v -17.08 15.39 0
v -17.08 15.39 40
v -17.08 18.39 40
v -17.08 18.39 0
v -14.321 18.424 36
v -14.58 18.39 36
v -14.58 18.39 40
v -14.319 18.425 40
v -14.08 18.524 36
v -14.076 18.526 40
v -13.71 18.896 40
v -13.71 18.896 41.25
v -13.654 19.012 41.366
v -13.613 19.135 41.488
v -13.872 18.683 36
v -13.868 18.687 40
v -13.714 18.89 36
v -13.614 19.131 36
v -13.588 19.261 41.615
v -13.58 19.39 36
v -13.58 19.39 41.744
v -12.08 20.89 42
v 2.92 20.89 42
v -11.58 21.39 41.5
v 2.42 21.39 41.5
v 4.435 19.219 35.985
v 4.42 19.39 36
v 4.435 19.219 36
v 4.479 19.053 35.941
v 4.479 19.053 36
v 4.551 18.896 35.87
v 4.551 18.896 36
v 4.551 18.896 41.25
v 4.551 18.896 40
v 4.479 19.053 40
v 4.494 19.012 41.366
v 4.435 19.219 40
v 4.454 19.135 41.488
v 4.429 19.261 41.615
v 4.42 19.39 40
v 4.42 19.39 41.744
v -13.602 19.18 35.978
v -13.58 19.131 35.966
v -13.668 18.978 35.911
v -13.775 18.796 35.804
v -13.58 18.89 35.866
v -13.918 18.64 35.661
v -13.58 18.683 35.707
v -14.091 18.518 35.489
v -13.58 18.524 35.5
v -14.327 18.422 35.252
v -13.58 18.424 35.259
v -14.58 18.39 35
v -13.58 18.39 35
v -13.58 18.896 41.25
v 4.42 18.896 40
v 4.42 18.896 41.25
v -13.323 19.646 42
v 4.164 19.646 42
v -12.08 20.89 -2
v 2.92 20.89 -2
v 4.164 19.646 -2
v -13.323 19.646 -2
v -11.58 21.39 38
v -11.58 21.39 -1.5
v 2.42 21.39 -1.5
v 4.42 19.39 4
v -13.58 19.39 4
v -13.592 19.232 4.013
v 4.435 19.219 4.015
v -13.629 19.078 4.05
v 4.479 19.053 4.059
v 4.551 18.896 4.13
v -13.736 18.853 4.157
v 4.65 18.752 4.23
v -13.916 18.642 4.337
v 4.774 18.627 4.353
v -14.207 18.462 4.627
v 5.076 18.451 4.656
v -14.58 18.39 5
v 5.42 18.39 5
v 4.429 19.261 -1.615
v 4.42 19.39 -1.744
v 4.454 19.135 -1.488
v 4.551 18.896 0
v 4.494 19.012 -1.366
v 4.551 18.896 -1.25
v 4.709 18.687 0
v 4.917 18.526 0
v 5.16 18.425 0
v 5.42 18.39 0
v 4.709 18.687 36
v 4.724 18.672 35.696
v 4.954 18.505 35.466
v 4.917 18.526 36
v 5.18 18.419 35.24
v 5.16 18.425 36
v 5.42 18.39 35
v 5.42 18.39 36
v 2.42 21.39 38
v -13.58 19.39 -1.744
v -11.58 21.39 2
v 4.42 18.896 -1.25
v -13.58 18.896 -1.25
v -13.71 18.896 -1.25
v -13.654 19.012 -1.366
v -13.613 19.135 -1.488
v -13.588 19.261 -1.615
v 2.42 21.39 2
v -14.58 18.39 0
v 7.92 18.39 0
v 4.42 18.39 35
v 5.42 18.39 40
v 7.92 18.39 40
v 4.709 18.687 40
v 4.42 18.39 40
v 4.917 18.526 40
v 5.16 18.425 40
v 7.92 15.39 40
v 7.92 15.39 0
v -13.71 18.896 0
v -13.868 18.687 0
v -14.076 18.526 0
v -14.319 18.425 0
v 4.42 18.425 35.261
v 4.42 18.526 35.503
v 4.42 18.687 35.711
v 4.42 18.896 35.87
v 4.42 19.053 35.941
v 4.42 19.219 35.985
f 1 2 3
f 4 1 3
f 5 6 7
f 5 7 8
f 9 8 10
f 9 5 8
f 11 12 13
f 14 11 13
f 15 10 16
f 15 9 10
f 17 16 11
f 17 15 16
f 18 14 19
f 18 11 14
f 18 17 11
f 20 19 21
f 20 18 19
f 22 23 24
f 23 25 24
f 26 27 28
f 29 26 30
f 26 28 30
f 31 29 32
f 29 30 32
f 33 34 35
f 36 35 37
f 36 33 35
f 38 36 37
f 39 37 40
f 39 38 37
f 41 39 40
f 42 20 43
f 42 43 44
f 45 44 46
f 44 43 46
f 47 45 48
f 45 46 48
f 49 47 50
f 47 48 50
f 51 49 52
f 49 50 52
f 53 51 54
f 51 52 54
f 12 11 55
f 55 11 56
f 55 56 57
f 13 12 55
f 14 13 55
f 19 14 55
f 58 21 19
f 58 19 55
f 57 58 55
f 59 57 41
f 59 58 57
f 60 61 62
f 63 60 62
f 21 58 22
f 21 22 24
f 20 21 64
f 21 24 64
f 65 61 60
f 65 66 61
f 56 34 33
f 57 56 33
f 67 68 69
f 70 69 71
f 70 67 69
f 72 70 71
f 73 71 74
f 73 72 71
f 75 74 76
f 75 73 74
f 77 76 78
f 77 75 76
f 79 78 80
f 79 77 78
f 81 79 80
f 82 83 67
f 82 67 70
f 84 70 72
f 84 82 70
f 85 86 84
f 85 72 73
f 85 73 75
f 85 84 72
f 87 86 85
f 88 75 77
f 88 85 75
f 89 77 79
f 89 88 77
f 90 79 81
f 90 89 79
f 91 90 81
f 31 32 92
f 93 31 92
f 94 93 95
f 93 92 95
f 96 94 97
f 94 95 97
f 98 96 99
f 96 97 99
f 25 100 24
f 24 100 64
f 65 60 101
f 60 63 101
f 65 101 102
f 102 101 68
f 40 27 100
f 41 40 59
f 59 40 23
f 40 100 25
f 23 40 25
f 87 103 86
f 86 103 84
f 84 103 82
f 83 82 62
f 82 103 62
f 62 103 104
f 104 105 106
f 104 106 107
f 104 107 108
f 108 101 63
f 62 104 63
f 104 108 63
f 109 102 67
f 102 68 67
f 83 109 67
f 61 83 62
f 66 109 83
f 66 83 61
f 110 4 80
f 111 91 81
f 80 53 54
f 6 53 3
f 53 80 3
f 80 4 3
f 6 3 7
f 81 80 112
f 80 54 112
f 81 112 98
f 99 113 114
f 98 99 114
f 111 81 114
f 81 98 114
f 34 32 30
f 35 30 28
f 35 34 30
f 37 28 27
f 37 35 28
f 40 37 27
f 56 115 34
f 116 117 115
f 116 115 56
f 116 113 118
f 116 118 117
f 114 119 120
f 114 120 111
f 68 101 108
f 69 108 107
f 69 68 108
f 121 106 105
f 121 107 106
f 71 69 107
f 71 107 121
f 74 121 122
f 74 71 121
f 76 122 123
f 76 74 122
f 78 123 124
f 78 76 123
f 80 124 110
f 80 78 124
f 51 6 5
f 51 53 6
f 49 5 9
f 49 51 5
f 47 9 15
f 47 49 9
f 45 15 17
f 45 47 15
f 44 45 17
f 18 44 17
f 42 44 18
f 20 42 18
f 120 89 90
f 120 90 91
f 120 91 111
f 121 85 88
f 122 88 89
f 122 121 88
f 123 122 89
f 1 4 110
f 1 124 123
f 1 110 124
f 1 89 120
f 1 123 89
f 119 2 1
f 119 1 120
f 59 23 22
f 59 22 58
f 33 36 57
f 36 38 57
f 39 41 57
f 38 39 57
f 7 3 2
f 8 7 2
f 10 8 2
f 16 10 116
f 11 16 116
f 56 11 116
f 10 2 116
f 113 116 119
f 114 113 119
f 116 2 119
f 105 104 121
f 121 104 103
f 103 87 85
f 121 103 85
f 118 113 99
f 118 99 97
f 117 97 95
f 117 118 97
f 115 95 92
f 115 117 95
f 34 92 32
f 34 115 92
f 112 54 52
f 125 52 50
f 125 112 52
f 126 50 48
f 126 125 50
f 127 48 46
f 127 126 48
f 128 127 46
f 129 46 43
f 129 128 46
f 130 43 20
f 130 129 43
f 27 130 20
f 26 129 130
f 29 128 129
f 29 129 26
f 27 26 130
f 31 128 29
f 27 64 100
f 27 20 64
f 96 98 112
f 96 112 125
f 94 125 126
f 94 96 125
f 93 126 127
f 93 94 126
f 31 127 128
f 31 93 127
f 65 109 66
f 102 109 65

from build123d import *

# Parameters (mm, degrees)
SKETCH_1_W      = 25
SKETCH_1_H      = 3
EXTRUDE_1_DEPTH = 20
SKETCH_2_W      = 18
SKETCH_2_H      = 4
EXTRUDE_2_DEPTH = 3
EXTRUDE_3_DEPTH = 2
CHAMFER_1_SIZE  = 0.75
CHAMFER_2_SIZE  = 0.5
CHAMFER_3_SIZE  = 2
CHAMFER1_SIZE   = 2
FILLET1_R       = 1


with BuildPart() as part:
    # Эскиз1 → Бобышка-Вытянуть1 (new body)
    with BuildSketch(Plane.XY):
        with Locations((-4.579529598, 16.89)):
            Rectangle(SKETCH_1_W, SKETCH_1_H)
    extrude(amount=EXTRUDE_1_DEPTH)

    # Эскиз2 → Бобышка-Вытянуть2 (add)
    with BuildSketch(Plane(origin=(0, 18.39, 0), x_dir=(1, 0, 0), z_dir=(0, 1, 0))):
        with Locations((-4.579529598, -2)):
            Rectangle(SKETCH_2_W, SKETCH_2_H)
    extrude(amount=EXTRUDE_2_DEPTH)

    # Эскиз3 → Бобышка-Вытянуть3 (add)
    with BuildSketch(Plane(origin=(0, 0, 0), x_dir=(-1, 0, 0), z_dir=(0, 0, -1))):
        Polygon((-4.420470402, 21.39), (13.579529598, 21.39), (13.579529598, 19.89), (13.579529598, 18.896471803), (-4.420470402, 18.896471803), (-4.420470402, 19.89), align=None)
    extrude(amount=EXTRUDE_3_DEPTH)

    # Фаска1
    chamfer_1_edges = [part.edges().sort_by_distance(p)[0] for p in [
        (-4.579529598, 18.896471803, -2),
    ]]
    chamfer(chamfer_1_edges, length=CHAMFER_1_SIZE)

    # Фаска2
    chamfer_2_edges = [part.edges().sort_by_distance(p)[0] for p in [
        (-4.579529598, 21.39, -2),
    ]]
    chamfer(chamfer_2_edges, length=CHAMFER_2_SIZE)

    # Фаска3
    chamfer_3_edges = [part.edges().sort_by_distance(p)[0] for p in [
        (-4.579529598, 21.39, 4),
    ]]
    chamfer(chamfer_3_edges, length=CHAMFER_3_SIZE)

    # Зеркальное отражение1: part across plane


with BuildPart() as part_1:
    add(part.part)
    add(part.part.mirror(Plane.XY.offset(20)))

    # Chamfer1
    chamfer1_edges = [part_1.edges().sort_by_distance(p)[0] for p in [
        (4.420470402, 21.39, 39.75),
        (-13.579529598, 21.39, 39.75),
        (4.420470402, 21.39, 0.25),
        (-13.579529598, 21.39, 0.25),
    ]]
    chamfer(chamfer1_edges, length=CHAMFER1_SIZE)

    # Fillet1
    # the kernel refuses this fillet: 1 mm, written as the material it adds along each edge
    with BuildSketch(Plane(origin=(-13.579529598, 18.39, 6.5), x_dir=(-1, 0, 0), z_dir=(0, 0, -1))) as fillet1_piece_1_section:
        with BuildLine():
            CenterArc((FILLET1_R, FILLET1_R), FILLET1_R, 180, 90)
            Line((0, FILLET1_R), (0, 0))
            Line((0, 0), (FILLET1_R, 0))
        make_face()
    fillet1_piece_1 = extrude(amount=6.5, mode=Mode.PRIVATE)
    fillet1_piece_1 = split(fillet1_piece_1, bisect_by=Plane(origin=(-13.579529598, 17.64, 5.75), z_dir=(0, -0.7071067811865476, -0.7071067811865476)), keep=Keep.TOP, mode=Mode.PRIVATE)
    fillet1_piece_1 = fillet1_piece_1 - Plane(origin=(-13.579529598, 19.39, 5), x_dir=(0, 0, -1), z_dir=(1, 0, 0)) * Cylinder(1, 17, mode=Mode.PRIVATE)
    add(fillet1_piece_1)
    with BuildSketch(Plane(origin=(-13.579529598, 18.39, 6.5), x_dir=(-1, 0, 0), z_dir=(0, 0, -1))) as fillet1_piece_2_section:
        with BuildLine():
            CenterArc((FILLET1_R, FILLET1_R), FILLET1_R, 180, 90)
            Line((0, FILLET1_R), (0, 0))
            Line((0, 0), (FILLET1_R, 0))
        make_face()
    fillet1_piece_2 = extrude(amount=9, mode=Mode.PRIVATE)
    fillet1_piece_2 = split(fillet1_piece_2, bisect_by=Plane(origin=(-13.579529598, 14.768235901, 2.878235901), z_dir=(0, 0.7071067811865476, 0.7071067811865476)), keep=Keep.TOP, mode=Mode.PRIVATE)
    fillet1_piece_2 = split(fillet1_piece_2, bisect_by=Plane(origin=(-13.579529598, 18.896471803, 6.5), z_dir=(0, 1, 0)), keep=Keep.TOP, mode=Mode.PRIVATE)
    fillet1_piece_2 = split(fillet1_piece_2, bisect_by=Plane(origin=(-13.579529598, 18.39, 0), z_dir=(0, 0, -1)), keep=Keep.TOP, mode=Mode.PRIVATE)
    add(fillet1_piece_2)
    with BuildSketch(Plane(origin=(6.920470402, 18.39, 4), x_dir=(0, 1, 0), z_dir=(-1, 0, 0))) as fillet1_piece_3_section:
        with BuildLine():
            CenterArc((FILLET1_R, -FILLET1_R), FILLET1_R, 90, 90)
            Line((0, -FILLET1_R), (0, 0))
            Line((0, 0), (FILLET1_R, 0))
        make_face()
    fillet1_piece_3 = extrude(amount=23, mode=Mode.PRIVATE)
    fillet1_piece_3 = split(fillet1_piece_3, bisect_by=Plane(origin=(6.170470402, 17.64, 4), z_dir=(-0.7071067811865476, -0.7071067811865476, 0)), keep=Keep.TOP, mode=Mode.PRIVATE)
    fillet1_piece_3 = split(fillet1_piece_3, bisect_by=Plane(origin=(-3.829529598, 29.14, 4), z_dir=(0.7071067811865476, -0.7071067811865476, 0)), keep=Keep.TOP, mode=Mode.PRIVATE)
    fillet1_piece_3 = fillet1_piece_3 - Plane(origin=(-14.579529598, 19.39, 4), x_dir=(0, -1, 0), z_dir=(0, 0, 1)) * Cylinder(1, 50, mode=Mode.PRIVATE)
    fillet1_piece_3 = fillet1_piece_3 - Plane(origin=(5.420470402, 19.39, 4), x_dir=(-1, 0, 0), z_dir=(0, 0, -1)) * Cylinder(1, 50, mode=Mode.PRIVATE)
    add(fillet1_piece_3)
    with BuildSketch(Plane(origin=(4.420470402, 18.39, -2.5), x_dir=(0, 1, 0), z_dir=(0, 0, 1))) as fillet1_piece_4_section:
        with BuildLine():
            CenterArc((FILLET1_R, -FILLET1_R), FILLET1_R, 90, 90)
            Line((0, -FILLET1_R), (0, 0))
            Line((0, 0), (FILLET1_R, 0))
        make_face()
    fillet1_piece_4 = extrude(amount=9, mode=Mode.PRIVATE)
    fillet1_piece_4 = split(fillet1_piece_4, bisect_by=Plane(origin=(4.420470402, 19.268235901, -1.621764099), z_dir=(0, 0.7071067811865476, 0.7071067811865476)), keep=Keep.TOP, mode=Mode.PRIVATE)
    fillet1_piece_4 = split(fillet1_piece_4, bisect_by=Plane(origin=(4.420470402, 18.896471803, -2.5), z_dir=(0, 1, 0)), keep=Keep.TOP, mode=Mode.PRIVATE)
    fillet1_piece_4 = split(fillet1_piece_4, bisect_by=Plane(origin=(4.420470402, 22.14, 1.25), z_dir=(0, -0.7071067811865476, -0.7071067811865476)), keep=Keep.TOP, mode=Mode.PRIVATE)
    fillet1_piece_4 = fillet1_piece_4 - Plane(origin=(4.420470402, 19.39, 5), x_dir=(0, 0, -1), z_dir=(1, 0, 0)) * Cylinder(1, 22, mode=Mode.PRIVATE)
    add(fillet1_piece_4)
    with BuildSketch(Plane(origin=(4.420470402, 18.39, 0), x_dir=(0, 1, 0), z_dir=(0, 0, 1))) as fillet1_piece_5_section:
        with BuildLine():
            CenterArc((FILLET1_R, -FILLET1_R), FILLET1_R, 90, 90)
            Line((0, -FILLET1_R), (0, 0))
            Line((0, 0), (FILLET1_R, 0))
        make_face()
    fillet1_piece_5 = extrude(amount=6.5, mode=Mode.PRIVATE)
    fillet1_piece_5 = split(fillet1_piece_5, bisect_by=Plane(origin=(4.420470402, 20.89, 2.5), z_dir=(0, -0.7071067811865476, -0.7071067811865476)), keep=Keep.TOP, mode=Mode.PRIVATE)
    fillet1_piece_5 = fillet1_piece_5 - Plane(origin=(4.420470402, 19.39, 5), x_dir=(0, 0, -1), z_dir=(1, 0, 0)) * Cylinder(1, 17, mode=Mode.PRIVATE)
    add(fillet1_piece_5)
    with BuildSketch(Plane(origin=(-13.579529598, 18.39, 33.5), x_dir=(-1, 0, 0), z_dir=(0, 0, 1))) as fillet1_piece_6_section:
        with BuildLine():
            CenterArc((FILLET1_R, -FILLET1_R), FILLET1_R, 90, 90)
            Line((0, -FILLET1_R), (0, 0))
            Line((0, 0), (FILLET1_R, 0))
        make_face()
    fillet1_piece_6 = extrude(amount=6.5, mode=Mode.PRIVATE)
    fillet1_piece_6 = split(fillet1_piece_6, bisect_by=Plane(origin=(-13.579529598, 17.64, 34.25), z_dir=(0, -0.7071067811865476, 0.7071067811865476)), keep=Keep.TOP, mode=Mode.PRIVATE)
    fillet1_piece_6 = fillet1_piece_6 - Plane(origin=(-13.579529598, 19.39, 35), x_dir=(0, -1, 0), z_dir=(1, 0, 0)) * Cylinder(1, 17, mode=Mode.PRIVATE)
    add(fillet1_piece_6)
    with BuildSketch(Plane(origin=(-13.579529598, 18.39, 36), x_dir=(-1, 0, 0), z_dir=(0, 0, 1))) as fillet1_piece_7_section:
        with BuildLine():
            CenterArc((FILLET1_R, -FILLET1_R), FILLET1_R, 90, 90)
            Line((0, -FILLET1_R), (0, 0))
            Line((0, 0), (FILLET1_R, 0))
        make_face()
    fillet1_piece_7 = extrude(amount=6.5, mode=Mode.PRIVATE)
    fillet1_piece_7 = split(fillet1_piece_7, bisect_by=Plane(origin=(-13.579529598, 18.896471803, 36), z_dir=(0, 1, 0)), keep=Keep.TOP, mode=Mode.PRIVATE)
    fillet1_piece_7 = split(fillet1_piece_7, bisect_by=Plane(origin=(-13.579529598, 16.018235901, 38.371764099), z_dir=(0, 0.7071067811865476, -0.7071067811865476)), keep=Keep.TOP, mode=Mode.PRIVATE)
    add(fillet1_piece_7)
    with BuildSketch(Plane(origin=(6.920470402, 18.39, 36), x_dir=(0, 0, -1), z_dir=(-1, 0, 0))) as fillet1_piece_8_section:
        with BuildLine():
            CenterArc((FILLET1_R, -FILLET1_R), FILLET1_R, 90, 90)
            Line((0, -FILLET1_R), (0, 0))
            Line((0, 0), (FILLET1_R, 0))
        make_face()
    fillet1_piece_8 = extrude(amount=23, mode=Mode.PRIVATE)
    fillet1_piece_8 = split(fillet1_piece_8, bisect_by=Plane(origin=(-3.829529598, 29.14, 36), z_dir=(0.7071067811865476, -0.7071067811865476, 0)), keep=Keep.TOP, mode=Mode.PRIVATE)
    fillet1_piece_8 = split(fillet1_piece_8, bisect_by=Plane(origin=(6.170470402, 17.64, 36), z_dir=(-0.7071067811865476, -0.7071067811865476, 0)), keep=Keep.TOP, mode=Mode.PRIVATE)
    fillet1_piece_8 = fillet1_piece_8 - Plane(origin=(-14.579529598, 19.39, 36), x_dir=(0, -1, 0), z_dir=(0, 0, -1)) * Cylinder(1, 50, mode=Mode.PRIVATE)
    fillet1_piece_8 = fillet1_piece_8 - Plane(origin=(5.420470402, 19.39, 36), x_dir=(0, -1, 0), z_dir=(0, 0, 1)) * Cylinder(1, 50, mode=Mode.PRIVATE)
    add(fillet1_piece_8)
    with BuildSketch(Plane(origin=(4.420470402, 18.39, 42.5), x_dir=(1, 0, 0), z_dir=(0, 0, -1))) as fillet1_piece_9_section:
        with BuildLine():
            CenterArc((FILLET1_R, -FILLET1_R), FILLET1_R, 90, 90)
            Line((0, -FILLET1_R), (0, 0))
            Line((0, 0), (FILLET1_R, 0))
        make_face()
    fillet1_piece_9 = extrude(amount=9, mode=Mode.PRIVATE)
    fillet1_piece_9 = split(fillet1_piece_9, bisect_by=Plane(origin=(4.420470402, 18.896471803, 42.5), z_dir=(0, 1, 0)), keep=Keep.TOP, mode=Mode.PRIVATE)
    fillet1_piece_9 = split(fillet1_piece_9, bisect_by=Plane(origin=(4.420470402, 19.268235901, 41.621764099), z_dir=(0, 0.7071067811865476, -0.7071067811865476)), keep=Keep.TOP, mode=Mode.PRIVATE)
    fillet1_piece_9 = split(fillet1_piece_9, bisect_by=Plane(origin=(4.420470402, 22.14, 38.75), z_dir=(0, -0.7071067811865476, 0.7071067811865476)), keep=Keep.TOP, mode=Mode.PRIVATE)
    fillet1_piece_9 = fillet1_piece_9 - Plane(origin=(4.420470402, 19.39, 35), x_dir=(0, -1, 0), z_dir=(1, 0, 0)) * Cylinder(1, 22, mode=Mode.PRIVATE)
    add(fillet1_piece_9)
    with BuildSketch(Plane(origin=(4.420470402, 18.39, 40), x_dir=(1, 0, 0), z_dir=(0, 0, -1))) as fillet1_piece_10_section:
        with BuildLine():
            CenterArc((FILLET1_R, -FILLET1_R), FILLET1_R, 90, 90)
            Line((0, -FILLET1_R), (0, 0))
            Line((0, 0), (FILLET1_R, 0))
        make_face()
    fillet1_piece_10 = extrude(amount=6.5, mode=Mode.PRIVATE)
    fillet1_piece_10 = split(fillet1_piece_10, bisect_by=Plane(origin=(4.420470402, 20.89, 37.5), z_dir=(0, -0.7071067811865476, 0.7071067811865476)), keep=Keep.TOP, mode=Mode.PRIVATE)
    fillet1_piece_10 = fillet1_piece_10 - Plane(origin=(4.420470402, 19.39, 35), x_dir=(0, -1, 0), z_dir=(1, 0, 0)) * Cylinder(1, 17, mode=Mode.PRIVATE)
    add(fillet1_piece_10)


solid = part_1.part
